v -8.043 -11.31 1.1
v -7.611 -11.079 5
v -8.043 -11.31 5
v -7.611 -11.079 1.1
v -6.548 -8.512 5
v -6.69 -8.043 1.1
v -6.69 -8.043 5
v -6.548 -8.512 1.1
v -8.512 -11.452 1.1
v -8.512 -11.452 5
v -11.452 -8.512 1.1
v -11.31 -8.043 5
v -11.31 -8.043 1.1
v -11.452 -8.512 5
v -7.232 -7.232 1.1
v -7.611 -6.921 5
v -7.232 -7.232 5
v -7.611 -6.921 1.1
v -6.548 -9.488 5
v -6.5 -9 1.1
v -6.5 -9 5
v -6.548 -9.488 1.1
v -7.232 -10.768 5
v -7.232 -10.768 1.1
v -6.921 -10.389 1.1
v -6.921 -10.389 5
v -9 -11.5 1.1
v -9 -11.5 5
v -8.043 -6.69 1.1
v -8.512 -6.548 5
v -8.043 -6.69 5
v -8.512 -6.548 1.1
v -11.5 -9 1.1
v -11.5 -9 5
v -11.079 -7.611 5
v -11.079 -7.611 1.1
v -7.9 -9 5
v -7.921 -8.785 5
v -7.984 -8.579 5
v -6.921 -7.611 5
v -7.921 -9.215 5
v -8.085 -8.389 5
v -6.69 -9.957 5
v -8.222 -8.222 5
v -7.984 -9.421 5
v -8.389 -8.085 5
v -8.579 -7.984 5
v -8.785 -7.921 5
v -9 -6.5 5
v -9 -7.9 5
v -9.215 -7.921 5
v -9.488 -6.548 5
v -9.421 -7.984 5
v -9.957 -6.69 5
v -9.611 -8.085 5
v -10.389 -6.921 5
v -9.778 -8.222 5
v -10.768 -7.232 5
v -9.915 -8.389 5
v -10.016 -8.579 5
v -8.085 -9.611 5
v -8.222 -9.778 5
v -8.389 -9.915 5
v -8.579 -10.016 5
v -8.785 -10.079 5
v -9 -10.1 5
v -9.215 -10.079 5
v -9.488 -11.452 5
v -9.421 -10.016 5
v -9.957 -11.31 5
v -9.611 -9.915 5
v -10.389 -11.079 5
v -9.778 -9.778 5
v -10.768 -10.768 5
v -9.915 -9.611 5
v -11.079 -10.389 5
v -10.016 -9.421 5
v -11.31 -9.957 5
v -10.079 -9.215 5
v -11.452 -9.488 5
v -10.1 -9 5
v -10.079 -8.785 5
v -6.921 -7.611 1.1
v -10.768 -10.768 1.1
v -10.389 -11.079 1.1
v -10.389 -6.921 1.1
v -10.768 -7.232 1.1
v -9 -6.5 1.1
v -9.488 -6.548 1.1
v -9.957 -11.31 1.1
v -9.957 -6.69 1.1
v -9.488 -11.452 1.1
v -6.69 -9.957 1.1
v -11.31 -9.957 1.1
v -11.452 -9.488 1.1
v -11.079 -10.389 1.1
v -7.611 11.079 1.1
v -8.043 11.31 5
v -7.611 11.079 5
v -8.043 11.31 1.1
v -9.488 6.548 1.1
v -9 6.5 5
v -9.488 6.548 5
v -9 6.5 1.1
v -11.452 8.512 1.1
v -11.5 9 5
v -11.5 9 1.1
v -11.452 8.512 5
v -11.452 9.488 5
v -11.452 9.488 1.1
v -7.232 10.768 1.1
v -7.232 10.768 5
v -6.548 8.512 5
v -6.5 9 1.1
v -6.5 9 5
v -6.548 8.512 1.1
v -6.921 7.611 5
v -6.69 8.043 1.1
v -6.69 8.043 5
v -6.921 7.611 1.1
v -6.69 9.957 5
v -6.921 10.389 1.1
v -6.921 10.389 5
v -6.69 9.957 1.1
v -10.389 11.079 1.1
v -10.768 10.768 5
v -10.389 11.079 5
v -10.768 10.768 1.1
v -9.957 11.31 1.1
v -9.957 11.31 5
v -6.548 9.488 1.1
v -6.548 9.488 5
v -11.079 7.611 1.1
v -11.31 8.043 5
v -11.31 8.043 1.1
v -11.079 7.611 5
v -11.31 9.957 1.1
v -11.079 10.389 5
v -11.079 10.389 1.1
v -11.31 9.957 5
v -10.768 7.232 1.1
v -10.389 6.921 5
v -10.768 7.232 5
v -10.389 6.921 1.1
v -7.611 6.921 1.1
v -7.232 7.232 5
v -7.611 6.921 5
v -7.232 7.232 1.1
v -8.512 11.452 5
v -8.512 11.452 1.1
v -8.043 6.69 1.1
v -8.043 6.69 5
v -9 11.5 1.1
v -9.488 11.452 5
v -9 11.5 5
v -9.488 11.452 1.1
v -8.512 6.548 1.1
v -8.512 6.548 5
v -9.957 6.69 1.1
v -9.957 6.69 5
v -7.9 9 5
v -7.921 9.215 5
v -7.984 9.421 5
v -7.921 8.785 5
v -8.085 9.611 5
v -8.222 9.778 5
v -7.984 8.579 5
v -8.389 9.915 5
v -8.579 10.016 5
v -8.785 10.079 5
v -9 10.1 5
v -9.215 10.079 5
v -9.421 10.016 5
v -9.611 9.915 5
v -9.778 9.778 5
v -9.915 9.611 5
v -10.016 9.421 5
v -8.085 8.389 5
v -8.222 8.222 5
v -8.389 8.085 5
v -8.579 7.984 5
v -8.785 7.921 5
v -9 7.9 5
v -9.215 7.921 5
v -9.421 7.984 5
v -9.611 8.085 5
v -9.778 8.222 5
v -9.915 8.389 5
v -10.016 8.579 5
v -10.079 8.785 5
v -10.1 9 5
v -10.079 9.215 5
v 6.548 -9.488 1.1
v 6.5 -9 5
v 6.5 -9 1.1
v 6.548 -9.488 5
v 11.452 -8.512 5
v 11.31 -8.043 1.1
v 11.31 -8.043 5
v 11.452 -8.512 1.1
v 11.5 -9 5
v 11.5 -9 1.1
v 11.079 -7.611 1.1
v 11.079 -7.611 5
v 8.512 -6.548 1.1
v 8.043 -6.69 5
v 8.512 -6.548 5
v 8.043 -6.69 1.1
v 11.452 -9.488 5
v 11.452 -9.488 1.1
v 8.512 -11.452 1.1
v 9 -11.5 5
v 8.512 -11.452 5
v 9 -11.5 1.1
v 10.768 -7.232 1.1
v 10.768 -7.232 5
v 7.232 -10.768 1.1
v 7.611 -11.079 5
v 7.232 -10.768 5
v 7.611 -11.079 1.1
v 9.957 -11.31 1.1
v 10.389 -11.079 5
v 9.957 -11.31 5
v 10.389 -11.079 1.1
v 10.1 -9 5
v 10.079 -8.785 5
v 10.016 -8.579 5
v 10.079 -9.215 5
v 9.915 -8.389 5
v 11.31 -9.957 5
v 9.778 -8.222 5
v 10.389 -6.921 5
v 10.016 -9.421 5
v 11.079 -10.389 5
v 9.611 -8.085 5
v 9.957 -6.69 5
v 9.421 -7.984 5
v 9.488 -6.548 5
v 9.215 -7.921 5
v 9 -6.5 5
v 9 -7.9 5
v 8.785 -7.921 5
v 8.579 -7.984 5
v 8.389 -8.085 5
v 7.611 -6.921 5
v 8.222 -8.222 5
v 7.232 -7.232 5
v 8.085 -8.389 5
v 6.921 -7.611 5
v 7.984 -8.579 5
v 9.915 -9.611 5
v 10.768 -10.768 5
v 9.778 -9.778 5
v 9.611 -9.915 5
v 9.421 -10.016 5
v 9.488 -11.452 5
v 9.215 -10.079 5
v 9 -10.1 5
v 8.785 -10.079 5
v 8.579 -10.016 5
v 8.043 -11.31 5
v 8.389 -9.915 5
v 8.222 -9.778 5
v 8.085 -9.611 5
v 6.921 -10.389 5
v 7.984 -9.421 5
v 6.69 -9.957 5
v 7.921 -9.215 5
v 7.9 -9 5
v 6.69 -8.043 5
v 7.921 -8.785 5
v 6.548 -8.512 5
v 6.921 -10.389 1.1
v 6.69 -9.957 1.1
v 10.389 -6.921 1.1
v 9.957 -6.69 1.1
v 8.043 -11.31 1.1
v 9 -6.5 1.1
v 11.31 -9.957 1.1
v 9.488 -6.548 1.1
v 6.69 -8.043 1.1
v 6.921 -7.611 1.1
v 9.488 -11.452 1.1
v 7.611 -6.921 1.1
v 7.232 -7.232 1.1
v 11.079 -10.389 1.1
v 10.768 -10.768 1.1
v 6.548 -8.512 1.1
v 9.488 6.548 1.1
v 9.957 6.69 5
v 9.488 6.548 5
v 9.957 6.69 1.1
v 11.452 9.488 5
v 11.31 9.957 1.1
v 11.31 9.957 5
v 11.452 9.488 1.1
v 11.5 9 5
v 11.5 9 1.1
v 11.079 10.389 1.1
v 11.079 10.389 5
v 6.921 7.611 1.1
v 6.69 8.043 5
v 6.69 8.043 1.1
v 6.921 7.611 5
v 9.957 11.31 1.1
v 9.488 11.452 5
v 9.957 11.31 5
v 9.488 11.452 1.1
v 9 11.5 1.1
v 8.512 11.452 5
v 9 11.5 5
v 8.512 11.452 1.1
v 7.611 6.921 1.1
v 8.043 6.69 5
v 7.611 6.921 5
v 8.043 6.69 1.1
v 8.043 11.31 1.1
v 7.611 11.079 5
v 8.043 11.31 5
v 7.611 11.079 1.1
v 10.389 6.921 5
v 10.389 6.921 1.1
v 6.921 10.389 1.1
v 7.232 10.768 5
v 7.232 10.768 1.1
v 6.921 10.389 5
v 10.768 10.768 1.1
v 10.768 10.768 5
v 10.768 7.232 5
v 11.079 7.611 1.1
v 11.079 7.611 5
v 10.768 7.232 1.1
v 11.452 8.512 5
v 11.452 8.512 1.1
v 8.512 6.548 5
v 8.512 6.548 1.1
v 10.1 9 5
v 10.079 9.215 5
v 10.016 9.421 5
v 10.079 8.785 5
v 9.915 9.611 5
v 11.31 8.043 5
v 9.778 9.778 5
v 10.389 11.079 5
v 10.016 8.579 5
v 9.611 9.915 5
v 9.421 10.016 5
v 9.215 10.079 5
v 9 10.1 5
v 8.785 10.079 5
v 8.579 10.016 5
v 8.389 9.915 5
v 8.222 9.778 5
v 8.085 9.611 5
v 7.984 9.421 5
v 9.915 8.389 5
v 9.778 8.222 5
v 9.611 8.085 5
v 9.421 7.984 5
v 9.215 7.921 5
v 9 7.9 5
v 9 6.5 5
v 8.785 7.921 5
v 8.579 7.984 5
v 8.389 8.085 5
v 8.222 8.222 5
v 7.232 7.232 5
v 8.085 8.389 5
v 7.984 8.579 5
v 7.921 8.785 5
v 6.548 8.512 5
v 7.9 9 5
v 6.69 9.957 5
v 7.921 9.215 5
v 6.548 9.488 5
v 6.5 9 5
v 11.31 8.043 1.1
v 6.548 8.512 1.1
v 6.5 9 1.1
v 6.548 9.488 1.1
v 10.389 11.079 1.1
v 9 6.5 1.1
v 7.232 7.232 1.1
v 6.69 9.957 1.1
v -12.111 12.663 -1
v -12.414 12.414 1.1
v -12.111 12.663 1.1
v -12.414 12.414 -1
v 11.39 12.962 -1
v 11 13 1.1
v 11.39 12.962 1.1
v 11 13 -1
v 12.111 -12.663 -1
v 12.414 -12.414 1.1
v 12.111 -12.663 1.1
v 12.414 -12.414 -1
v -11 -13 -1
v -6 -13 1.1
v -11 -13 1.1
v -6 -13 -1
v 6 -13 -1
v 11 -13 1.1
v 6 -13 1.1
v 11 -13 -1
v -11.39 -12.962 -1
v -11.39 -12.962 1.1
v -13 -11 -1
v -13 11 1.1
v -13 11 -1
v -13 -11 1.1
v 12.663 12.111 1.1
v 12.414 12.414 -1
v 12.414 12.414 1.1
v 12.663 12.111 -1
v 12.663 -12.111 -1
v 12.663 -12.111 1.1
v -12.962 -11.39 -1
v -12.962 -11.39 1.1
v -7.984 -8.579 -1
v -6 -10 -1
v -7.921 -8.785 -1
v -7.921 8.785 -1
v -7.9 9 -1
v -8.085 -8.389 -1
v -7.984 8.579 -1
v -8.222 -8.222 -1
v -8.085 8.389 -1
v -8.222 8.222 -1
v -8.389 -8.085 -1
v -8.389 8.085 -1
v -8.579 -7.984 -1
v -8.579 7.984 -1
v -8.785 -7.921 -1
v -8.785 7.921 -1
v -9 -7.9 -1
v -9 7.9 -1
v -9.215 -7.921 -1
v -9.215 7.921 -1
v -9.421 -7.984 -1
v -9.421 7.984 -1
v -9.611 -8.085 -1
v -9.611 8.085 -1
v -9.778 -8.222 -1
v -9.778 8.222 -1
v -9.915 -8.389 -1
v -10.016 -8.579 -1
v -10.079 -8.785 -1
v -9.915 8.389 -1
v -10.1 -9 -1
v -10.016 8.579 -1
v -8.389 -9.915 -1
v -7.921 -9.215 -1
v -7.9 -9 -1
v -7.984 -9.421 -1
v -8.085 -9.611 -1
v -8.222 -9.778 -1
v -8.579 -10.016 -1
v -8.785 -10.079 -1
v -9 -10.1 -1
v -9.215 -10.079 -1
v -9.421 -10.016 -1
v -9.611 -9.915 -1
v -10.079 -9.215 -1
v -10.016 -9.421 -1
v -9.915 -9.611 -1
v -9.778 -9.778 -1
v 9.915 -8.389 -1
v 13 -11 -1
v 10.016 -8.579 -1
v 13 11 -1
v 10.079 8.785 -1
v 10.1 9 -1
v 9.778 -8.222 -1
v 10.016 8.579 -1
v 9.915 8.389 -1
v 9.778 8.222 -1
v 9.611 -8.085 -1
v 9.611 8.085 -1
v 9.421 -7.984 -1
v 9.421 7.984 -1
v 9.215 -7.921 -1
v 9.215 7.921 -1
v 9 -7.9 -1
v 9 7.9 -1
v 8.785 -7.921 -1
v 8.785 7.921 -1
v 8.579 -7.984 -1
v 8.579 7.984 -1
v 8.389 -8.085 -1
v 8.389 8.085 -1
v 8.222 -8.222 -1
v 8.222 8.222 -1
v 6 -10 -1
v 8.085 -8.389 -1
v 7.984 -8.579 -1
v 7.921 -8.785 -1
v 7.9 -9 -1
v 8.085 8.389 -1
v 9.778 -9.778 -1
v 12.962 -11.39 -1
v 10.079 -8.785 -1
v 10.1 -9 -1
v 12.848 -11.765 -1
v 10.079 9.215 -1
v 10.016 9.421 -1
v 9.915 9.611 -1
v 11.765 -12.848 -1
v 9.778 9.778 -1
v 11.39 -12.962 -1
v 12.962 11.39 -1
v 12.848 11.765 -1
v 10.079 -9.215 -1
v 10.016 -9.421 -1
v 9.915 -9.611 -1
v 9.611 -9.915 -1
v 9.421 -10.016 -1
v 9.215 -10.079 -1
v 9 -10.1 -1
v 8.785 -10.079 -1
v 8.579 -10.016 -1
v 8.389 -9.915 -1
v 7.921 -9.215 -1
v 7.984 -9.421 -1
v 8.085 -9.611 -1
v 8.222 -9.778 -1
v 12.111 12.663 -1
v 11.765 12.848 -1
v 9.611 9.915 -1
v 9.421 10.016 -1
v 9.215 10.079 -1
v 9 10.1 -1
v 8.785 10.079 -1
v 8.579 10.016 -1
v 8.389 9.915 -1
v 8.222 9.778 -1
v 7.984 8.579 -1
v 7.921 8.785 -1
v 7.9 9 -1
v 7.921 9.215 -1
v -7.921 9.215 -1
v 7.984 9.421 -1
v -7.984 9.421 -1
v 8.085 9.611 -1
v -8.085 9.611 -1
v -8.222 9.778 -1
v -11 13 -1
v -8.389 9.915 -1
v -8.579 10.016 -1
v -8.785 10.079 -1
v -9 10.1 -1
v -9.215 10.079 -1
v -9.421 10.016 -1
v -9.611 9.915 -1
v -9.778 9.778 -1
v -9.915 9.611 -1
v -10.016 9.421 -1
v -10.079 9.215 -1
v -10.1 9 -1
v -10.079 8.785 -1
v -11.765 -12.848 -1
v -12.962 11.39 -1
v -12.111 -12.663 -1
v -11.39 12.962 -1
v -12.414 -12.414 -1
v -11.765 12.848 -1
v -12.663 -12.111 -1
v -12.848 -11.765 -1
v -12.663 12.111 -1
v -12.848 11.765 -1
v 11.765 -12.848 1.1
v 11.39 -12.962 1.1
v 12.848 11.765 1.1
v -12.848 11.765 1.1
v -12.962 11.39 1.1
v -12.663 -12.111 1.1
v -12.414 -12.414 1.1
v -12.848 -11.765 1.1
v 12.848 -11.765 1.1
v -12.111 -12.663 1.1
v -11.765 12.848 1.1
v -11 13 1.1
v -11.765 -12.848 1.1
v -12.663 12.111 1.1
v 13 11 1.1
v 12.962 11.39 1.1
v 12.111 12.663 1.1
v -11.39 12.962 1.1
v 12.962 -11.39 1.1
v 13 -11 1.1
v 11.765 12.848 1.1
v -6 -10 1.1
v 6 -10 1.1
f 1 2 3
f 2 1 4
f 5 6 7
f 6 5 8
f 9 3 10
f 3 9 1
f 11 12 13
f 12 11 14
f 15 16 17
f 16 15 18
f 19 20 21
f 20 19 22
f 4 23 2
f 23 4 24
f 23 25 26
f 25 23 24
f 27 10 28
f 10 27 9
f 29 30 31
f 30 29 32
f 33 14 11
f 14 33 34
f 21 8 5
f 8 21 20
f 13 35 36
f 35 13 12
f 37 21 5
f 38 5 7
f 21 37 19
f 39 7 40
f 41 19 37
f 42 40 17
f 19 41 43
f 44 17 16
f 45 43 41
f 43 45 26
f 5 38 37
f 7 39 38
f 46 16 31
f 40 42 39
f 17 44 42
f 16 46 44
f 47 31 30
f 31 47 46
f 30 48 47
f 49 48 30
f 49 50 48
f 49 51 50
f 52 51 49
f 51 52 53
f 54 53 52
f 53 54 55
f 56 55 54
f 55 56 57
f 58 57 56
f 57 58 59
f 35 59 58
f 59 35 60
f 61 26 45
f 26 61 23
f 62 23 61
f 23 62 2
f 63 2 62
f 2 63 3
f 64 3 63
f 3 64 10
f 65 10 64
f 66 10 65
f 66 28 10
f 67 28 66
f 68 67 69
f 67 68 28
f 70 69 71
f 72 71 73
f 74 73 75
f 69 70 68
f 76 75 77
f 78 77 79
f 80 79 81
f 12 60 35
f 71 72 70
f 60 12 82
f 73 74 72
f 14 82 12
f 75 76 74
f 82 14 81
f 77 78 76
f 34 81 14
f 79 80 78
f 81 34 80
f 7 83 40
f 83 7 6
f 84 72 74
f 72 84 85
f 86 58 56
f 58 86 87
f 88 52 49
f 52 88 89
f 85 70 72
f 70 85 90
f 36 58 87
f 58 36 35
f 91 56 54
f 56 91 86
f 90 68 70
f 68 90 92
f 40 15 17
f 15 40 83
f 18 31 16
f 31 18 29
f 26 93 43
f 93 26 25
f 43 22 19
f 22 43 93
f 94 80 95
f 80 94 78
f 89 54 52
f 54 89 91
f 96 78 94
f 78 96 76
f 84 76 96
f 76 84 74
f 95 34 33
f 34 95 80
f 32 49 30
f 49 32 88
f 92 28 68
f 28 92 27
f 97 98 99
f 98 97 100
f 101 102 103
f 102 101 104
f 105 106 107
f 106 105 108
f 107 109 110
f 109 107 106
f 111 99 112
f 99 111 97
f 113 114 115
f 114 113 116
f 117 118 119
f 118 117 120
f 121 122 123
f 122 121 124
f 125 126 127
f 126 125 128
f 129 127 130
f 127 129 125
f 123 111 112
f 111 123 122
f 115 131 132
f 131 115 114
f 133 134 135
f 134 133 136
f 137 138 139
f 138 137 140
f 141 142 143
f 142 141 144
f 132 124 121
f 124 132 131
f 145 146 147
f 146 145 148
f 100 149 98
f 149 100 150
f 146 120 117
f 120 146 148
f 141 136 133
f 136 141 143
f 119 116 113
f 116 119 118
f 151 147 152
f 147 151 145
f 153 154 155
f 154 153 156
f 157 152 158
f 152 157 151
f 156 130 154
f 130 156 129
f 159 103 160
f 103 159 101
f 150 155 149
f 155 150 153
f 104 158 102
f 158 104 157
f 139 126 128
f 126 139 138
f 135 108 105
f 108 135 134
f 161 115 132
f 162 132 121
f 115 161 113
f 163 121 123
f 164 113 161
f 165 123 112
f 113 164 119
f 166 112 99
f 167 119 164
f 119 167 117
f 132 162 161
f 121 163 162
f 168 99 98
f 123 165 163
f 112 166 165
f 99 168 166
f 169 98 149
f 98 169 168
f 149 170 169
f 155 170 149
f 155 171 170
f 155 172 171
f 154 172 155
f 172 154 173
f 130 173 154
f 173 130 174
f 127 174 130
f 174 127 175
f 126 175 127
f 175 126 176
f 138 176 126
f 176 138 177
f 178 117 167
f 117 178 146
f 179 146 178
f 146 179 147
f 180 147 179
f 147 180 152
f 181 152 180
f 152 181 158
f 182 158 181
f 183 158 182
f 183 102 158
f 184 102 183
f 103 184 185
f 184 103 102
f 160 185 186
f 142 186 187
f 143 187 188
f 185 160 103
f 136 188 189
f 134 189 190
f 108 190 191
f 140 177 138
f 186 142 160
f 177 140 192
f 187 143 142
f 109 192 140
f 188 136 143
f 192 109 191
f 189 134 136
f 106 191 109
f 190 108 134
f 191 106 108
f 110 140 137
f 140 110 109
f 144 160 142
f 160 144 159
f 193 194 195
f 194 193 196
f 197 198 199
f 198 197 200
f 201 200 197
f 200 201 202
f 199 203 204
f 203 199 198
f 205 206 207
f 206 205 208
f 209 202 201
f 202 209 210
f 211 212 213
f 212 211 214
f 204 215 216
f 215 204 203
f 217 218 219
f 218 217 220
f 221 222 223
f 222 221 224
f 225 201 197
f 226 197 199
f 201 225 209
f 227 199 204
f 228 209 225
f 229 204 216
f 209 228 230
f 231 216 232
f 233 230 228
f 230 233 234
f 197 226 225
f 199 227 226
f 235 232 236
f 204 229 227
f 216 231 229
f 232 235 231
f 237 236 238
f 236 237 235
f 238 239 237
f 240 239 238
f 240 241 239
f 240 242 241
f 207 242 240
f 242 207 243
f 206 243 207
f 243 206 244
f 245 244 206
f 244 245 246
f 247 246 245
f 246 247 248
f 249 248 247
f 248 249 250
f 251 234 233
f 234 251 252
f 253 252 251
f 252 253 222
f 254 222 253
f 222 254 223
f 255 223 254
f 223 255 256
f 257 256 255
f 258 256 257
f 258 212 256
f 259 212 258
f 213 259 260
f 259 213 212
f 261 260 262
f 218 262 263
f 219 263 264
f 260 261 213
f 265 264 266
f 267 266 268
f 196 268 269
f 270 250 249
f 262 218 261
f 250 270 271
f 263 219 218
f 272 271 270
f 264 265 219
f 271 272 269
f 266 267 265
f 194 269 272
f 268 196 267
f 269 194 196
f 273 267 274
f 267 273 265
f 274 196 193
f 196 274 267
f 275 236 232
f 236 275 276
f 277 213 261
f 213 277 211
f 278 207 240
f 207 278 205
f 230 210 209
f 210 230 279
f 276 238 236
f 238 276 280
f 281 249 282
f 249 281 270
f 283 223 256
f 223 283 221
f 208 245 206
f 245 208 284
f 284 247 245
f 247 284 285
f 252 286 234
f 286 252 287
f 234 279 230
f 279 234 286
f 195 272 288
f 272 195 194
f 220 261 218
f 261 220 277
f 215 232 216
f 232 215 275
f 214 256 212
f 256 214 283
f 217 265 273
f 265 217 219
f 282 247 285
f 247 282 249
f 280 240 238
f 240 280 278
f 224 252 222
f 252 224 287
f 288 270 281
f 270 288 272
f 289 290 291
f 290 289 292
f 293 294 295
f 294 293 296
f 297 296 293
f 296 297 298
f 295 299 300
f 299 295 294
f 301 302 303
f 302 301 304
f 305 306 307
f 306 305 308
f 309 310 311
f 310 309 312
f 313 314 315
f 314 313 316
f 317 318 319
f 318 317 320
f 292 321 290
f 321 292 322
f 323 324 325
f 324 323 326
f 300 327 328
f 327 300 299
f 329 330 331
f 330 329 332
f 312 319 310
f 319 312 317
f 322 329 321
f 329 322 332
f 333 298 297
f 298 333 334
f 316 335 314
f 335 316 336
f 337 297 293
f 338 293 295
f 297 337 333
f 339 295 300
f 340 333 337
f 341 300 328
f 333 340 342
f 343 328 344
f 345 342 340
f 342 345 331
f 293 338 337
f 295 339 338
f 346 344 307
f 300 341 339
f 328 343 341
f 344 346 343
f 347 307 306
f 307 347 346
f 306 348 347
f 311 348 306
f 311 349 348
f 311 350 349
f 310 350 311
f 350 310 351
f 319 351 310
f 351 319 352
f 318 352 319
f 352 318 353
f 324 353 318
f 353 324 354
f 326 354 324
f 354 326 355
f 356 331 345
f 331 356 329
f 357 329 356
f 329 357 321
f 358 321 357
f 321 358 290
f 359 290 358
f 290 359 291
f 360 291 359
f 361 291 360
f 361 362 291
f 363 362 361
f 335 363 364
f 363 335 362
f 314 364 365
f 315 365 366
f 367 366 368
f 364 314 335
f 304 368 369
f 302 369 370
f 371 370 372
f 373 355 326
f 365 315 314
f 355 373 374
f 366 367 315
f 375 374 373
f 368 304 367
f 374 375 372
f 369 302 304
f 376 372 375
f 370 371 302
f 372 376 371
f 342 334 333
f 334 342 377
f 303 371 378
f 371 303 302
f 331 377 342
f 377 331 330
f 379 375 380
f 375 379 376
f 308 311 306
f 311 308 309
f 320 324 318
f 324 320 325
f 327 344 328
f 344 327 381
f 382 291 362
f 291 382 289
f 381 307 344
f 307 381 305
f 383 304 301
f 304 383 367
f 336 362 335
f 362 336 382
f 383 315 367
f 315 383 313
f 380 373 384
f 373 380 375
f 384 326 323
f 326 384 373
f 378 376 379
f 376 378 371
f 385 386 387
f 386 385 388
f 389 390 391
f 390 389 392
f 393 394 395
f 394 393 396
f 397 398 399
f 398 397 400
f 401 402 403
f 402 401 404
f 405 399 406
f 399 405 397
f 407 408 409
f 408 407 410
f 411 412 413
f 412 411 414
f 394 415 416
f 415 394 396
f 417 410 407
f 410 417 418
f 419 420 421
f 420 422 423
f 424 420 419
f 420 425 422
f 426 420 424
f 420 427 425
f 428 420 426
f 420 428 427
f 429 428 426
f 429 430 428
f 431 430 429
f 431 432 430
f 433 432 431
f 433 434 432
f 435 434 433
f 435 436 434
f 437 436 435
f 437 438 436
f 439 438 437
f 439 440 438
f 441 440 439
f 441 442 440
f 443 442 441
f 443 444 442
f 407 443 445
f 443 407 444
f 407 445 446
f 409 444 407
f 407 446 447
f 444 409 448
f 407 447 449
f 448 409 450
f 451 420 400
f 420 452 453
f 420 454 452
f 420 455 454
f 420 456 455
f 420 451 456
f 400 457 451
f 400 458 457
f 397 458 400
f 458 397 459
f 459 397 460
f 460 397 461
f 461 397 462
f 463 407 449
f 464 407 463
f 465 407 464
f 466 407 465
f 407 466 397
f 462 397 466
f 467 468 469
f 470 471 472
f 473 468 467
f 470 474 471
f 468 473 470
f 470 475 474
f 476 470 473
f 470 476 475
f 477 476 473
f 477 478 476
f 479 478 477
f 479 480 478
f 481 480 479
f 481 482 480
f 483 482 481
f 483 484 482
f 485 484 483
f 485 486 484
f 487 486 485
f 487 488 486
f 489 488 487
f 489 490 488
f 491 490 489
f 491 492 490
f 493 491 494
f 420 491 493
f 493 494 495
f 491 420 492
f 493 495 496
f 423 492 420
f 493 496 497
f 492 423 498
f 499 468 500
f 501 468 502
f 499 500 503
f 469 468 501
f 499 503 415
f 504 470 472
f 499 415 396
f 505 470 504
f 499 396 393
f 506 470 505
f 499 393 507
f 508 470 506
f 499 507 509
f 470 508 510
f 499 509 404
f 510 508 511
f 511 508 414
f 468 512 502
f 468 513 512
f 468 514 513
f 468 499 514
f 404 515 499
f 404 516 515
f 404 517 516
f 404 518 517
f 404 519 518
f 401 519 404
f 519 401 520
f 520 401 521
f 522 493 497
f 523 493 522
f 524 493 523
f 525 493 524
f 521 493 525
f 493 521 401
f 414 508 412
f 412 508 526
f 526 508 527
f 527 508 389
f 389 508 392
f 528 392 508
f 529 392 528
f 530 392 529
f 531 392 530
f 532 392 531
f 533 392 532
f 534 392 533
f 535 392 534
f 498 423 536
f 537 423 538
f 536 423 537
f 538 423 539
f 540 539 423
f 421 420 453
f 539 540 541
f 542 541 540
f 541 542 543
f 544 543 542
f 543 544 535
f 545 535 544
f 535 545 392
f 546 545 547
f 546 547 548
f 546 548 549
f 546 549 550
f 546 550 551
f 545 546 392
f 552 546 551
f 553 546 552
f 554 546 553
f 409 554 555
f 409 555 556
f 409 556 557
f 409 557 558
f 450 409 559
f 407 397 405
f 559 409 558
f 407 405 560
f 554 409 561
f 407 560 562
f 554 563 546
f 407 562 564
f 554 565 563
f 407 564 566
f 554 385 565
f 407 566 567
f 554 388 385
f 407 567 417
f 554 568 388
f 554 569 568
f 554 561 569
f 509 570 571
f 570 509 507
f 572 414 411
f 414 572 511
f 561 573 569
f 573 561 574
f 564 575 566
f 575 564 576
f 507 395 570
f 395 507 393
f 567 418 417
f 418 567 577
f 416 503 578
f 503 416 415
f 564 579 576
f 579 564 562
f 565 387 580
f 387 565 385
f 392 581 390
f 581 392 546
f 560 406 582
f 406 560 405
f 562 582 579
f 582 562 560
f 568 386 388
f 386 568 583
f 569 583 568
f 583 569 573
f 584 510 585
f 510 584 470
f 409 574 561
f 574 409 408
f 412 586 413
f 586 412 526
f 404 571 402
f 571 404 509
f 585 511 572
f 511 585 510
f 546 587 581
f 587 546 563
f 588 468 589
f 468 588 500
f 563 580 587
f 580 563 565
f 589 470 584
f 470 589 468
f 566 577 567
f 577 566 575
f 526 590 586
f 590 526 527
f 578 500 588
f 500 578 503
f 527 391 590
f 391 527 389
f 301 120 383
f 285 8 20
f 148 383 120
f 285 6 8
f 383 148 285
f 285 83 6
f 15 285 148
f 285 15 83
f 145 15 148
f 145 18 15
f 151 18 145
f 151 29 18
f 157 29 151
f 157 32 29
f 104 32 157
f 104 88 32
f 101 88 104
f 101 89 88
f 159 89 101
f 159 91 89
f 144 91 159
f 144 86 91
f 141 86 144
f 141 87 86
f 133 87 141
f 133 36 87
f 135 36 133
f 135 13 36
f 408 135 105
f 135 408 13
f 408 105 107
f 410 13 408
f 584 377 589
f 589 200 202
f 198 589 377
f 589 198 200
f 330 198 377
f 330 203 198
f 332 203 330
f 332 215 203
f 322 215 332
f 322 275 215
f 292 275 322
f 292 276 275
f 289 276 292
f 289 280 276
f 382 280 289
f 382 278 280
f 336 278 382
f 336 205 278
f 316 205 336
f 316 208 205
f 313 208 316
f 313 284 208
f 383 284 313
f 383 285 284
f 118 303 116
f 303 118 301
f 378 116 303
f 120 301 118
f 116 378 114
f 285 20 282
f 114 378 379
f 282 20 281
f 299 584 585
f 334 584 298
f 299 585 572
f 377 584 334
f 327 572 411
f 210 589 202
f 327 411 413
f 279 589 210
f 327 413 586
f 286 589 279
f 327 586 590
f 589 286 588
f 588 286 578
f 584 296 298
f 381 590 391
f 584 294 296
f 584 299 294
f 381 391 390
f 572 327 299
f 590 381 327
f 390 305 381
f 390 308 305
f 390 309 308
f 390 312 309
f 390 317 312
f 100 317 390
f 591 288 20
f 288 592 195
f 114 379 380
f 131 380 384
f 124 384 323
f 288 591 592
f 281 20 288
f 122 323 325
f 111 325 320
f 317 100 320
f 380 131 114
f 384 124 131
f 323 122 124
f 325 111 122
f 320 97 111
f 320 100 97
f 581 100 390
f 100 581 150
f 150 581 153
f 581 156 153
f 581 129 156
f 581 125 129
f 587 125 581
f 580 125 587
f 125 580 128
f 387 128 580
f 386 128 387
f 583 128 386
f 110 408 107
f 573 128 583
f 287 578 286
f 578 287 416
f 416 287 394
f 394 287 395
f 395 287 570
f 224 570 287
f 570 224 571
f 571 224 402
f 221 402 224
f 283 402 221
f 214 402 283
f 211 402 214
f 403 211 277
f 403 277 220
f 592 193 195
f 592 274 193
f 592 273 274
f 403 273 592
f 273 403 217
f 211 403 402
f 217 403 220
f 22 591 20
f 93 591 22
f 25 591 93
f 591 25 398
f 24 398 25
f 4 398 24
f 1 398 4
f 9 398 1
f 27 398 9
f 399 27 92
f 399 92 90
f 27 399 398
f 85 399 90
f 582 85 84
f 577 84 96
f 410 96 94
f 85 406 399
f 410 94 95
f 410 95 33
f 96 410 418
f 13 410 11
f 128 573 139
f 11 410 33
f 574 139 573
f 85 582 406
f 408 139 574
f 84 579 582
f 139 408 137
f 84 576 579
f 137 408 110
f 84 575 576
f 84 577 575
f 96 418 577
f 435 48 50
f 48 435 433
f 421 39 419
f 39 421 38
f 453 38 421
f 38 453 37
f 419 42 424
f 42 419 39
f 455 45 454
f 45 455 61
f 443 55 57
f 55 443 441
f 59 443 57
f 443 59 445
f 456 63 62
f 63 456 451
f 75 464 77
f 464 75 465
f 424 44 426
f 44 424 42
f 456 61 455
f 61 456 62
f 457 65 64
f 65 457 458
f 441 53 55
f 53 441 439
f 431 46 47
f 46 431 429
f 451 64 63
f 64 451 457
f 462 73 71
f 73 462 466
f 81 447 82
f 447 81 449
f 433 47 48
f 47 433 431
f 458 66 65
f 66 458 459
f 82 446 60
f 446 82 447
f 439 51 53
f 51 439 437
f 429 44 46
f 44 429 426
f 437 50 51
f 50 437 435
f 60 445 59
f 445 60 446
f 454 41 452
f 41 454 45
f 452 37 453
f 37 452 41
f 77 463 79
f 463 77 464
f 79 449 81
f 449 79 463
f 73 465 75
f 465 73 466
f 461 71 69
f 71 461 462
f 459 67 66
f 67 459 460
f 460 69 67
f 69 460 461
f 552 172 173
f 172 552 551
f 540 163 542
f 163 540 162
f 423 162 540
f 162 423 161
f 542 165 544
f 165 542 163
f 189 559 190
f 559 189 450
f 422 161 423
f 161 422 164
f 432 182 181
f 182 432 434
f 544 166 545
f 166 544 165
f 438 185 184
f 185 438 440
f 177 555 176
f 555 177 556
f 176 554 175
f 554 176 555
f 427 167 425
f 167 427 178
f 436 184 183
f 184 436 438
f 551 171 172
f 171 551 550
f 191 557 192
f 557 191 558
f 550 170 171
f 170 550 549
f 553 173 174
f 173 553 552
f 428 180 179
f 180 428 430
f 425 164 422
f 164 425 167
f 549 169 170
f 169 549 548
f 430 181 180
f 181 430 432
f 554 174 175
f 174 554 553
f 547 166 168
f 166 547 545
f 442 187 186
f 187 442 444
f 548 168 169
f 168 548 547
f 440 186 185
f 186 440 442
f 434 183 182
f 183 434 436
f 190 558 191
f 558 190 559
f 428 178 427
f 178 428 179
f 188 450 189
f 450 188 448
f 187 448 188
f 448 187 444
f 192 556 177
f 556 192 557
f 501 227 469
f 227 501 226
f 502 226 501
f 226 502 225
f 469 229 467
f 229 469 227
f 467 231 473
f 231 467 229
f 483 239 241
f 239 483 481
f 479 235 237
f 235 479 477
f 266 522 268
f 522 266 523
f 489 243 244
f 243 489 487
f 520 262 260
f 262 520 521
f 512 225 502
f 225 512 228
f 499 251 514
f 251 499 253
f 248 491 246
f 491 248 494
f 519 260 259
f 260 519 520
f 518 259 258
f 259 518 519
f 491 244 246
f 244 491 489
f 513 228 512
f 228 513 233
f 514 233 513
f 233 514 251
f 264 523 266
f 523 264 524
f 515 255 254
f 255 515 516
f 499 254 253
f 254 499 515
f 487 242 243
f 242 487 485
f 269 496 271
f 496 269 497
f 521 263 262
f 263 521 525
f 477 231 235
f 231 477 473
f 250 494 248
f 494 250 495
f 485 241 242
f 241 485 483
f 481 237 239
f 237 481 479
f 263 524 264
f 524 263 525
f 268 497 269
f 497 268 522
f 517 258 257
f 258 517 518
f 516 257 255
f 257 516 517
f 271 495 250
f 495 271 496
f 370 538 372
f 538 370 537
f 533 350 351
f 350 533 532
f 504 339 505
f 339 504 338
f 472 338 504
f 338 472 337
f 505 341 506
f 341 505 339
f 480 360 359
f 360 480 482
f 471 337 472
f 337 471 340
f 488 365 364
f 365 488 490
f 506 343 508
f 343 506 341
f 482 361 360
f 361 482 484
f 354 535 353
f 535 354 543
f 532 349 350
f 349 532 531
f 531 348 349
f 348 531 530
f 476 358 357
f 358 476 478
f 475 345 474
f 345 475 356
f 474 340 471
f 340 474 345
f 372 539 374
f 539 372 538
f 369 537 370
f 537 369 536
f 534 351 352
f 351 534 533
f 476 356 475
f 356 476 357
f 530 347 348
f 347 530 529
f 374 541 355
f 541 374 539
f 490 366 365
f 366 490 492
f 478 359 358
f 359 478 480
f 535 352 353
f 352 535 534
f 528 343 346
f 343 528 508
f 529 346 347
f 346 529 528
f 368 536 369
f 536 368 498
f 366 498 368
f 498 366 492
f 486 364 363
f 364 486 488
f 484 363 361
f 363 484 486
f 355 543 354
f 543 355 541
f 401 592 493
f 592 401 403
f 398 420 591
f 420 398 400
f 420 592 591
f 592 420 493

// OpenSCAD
// Self-Balancing Cube — IMU Mount
// Fits: ICM-42688-P breakout (~20x20mm)
// Mounts at cube center of mass
// Print: PLA, 30% infill

$fn = 32;

board_l    = 22;
board_w    = 22;
standoff_h = 4;
standoff_d = 5;
wall_t     = 2;
corner_r   = 2;

difference() {
    union() {
        // Base plate with rounded corners
        minkowski() {
            cube([board_l, board_w, wall_t], center=true);
            cylinder(h=0.1, r=corner_r);
        }

        // 4 standoffs
        for (x = [-board_l/2 + 2, board_l/2 - 2]) {
            for (y = [-board_w/2 + 2, board_w/2 - 2]) {
                translate([x, y, wall_t/2])
                    cylinder(h=standoff_h, d=standoff_d);
            }
        }
    }

    // M2 holes in standoffs
    for (x = [-board_l/2 + 2, board_l/2 - 2]) {
        for (y = [-board_w/2 + 2, board_w/2 - 2]) {
            translate([x, y, -1])
                cylinder(h=standoff_h + wall_t + 2, d=2.2);
        }
    }

    // SPI cable exit
    translate([0, -board_w/2 - 1, 0])
        cube([12, 4, wall_t + 2], center=true);
}
